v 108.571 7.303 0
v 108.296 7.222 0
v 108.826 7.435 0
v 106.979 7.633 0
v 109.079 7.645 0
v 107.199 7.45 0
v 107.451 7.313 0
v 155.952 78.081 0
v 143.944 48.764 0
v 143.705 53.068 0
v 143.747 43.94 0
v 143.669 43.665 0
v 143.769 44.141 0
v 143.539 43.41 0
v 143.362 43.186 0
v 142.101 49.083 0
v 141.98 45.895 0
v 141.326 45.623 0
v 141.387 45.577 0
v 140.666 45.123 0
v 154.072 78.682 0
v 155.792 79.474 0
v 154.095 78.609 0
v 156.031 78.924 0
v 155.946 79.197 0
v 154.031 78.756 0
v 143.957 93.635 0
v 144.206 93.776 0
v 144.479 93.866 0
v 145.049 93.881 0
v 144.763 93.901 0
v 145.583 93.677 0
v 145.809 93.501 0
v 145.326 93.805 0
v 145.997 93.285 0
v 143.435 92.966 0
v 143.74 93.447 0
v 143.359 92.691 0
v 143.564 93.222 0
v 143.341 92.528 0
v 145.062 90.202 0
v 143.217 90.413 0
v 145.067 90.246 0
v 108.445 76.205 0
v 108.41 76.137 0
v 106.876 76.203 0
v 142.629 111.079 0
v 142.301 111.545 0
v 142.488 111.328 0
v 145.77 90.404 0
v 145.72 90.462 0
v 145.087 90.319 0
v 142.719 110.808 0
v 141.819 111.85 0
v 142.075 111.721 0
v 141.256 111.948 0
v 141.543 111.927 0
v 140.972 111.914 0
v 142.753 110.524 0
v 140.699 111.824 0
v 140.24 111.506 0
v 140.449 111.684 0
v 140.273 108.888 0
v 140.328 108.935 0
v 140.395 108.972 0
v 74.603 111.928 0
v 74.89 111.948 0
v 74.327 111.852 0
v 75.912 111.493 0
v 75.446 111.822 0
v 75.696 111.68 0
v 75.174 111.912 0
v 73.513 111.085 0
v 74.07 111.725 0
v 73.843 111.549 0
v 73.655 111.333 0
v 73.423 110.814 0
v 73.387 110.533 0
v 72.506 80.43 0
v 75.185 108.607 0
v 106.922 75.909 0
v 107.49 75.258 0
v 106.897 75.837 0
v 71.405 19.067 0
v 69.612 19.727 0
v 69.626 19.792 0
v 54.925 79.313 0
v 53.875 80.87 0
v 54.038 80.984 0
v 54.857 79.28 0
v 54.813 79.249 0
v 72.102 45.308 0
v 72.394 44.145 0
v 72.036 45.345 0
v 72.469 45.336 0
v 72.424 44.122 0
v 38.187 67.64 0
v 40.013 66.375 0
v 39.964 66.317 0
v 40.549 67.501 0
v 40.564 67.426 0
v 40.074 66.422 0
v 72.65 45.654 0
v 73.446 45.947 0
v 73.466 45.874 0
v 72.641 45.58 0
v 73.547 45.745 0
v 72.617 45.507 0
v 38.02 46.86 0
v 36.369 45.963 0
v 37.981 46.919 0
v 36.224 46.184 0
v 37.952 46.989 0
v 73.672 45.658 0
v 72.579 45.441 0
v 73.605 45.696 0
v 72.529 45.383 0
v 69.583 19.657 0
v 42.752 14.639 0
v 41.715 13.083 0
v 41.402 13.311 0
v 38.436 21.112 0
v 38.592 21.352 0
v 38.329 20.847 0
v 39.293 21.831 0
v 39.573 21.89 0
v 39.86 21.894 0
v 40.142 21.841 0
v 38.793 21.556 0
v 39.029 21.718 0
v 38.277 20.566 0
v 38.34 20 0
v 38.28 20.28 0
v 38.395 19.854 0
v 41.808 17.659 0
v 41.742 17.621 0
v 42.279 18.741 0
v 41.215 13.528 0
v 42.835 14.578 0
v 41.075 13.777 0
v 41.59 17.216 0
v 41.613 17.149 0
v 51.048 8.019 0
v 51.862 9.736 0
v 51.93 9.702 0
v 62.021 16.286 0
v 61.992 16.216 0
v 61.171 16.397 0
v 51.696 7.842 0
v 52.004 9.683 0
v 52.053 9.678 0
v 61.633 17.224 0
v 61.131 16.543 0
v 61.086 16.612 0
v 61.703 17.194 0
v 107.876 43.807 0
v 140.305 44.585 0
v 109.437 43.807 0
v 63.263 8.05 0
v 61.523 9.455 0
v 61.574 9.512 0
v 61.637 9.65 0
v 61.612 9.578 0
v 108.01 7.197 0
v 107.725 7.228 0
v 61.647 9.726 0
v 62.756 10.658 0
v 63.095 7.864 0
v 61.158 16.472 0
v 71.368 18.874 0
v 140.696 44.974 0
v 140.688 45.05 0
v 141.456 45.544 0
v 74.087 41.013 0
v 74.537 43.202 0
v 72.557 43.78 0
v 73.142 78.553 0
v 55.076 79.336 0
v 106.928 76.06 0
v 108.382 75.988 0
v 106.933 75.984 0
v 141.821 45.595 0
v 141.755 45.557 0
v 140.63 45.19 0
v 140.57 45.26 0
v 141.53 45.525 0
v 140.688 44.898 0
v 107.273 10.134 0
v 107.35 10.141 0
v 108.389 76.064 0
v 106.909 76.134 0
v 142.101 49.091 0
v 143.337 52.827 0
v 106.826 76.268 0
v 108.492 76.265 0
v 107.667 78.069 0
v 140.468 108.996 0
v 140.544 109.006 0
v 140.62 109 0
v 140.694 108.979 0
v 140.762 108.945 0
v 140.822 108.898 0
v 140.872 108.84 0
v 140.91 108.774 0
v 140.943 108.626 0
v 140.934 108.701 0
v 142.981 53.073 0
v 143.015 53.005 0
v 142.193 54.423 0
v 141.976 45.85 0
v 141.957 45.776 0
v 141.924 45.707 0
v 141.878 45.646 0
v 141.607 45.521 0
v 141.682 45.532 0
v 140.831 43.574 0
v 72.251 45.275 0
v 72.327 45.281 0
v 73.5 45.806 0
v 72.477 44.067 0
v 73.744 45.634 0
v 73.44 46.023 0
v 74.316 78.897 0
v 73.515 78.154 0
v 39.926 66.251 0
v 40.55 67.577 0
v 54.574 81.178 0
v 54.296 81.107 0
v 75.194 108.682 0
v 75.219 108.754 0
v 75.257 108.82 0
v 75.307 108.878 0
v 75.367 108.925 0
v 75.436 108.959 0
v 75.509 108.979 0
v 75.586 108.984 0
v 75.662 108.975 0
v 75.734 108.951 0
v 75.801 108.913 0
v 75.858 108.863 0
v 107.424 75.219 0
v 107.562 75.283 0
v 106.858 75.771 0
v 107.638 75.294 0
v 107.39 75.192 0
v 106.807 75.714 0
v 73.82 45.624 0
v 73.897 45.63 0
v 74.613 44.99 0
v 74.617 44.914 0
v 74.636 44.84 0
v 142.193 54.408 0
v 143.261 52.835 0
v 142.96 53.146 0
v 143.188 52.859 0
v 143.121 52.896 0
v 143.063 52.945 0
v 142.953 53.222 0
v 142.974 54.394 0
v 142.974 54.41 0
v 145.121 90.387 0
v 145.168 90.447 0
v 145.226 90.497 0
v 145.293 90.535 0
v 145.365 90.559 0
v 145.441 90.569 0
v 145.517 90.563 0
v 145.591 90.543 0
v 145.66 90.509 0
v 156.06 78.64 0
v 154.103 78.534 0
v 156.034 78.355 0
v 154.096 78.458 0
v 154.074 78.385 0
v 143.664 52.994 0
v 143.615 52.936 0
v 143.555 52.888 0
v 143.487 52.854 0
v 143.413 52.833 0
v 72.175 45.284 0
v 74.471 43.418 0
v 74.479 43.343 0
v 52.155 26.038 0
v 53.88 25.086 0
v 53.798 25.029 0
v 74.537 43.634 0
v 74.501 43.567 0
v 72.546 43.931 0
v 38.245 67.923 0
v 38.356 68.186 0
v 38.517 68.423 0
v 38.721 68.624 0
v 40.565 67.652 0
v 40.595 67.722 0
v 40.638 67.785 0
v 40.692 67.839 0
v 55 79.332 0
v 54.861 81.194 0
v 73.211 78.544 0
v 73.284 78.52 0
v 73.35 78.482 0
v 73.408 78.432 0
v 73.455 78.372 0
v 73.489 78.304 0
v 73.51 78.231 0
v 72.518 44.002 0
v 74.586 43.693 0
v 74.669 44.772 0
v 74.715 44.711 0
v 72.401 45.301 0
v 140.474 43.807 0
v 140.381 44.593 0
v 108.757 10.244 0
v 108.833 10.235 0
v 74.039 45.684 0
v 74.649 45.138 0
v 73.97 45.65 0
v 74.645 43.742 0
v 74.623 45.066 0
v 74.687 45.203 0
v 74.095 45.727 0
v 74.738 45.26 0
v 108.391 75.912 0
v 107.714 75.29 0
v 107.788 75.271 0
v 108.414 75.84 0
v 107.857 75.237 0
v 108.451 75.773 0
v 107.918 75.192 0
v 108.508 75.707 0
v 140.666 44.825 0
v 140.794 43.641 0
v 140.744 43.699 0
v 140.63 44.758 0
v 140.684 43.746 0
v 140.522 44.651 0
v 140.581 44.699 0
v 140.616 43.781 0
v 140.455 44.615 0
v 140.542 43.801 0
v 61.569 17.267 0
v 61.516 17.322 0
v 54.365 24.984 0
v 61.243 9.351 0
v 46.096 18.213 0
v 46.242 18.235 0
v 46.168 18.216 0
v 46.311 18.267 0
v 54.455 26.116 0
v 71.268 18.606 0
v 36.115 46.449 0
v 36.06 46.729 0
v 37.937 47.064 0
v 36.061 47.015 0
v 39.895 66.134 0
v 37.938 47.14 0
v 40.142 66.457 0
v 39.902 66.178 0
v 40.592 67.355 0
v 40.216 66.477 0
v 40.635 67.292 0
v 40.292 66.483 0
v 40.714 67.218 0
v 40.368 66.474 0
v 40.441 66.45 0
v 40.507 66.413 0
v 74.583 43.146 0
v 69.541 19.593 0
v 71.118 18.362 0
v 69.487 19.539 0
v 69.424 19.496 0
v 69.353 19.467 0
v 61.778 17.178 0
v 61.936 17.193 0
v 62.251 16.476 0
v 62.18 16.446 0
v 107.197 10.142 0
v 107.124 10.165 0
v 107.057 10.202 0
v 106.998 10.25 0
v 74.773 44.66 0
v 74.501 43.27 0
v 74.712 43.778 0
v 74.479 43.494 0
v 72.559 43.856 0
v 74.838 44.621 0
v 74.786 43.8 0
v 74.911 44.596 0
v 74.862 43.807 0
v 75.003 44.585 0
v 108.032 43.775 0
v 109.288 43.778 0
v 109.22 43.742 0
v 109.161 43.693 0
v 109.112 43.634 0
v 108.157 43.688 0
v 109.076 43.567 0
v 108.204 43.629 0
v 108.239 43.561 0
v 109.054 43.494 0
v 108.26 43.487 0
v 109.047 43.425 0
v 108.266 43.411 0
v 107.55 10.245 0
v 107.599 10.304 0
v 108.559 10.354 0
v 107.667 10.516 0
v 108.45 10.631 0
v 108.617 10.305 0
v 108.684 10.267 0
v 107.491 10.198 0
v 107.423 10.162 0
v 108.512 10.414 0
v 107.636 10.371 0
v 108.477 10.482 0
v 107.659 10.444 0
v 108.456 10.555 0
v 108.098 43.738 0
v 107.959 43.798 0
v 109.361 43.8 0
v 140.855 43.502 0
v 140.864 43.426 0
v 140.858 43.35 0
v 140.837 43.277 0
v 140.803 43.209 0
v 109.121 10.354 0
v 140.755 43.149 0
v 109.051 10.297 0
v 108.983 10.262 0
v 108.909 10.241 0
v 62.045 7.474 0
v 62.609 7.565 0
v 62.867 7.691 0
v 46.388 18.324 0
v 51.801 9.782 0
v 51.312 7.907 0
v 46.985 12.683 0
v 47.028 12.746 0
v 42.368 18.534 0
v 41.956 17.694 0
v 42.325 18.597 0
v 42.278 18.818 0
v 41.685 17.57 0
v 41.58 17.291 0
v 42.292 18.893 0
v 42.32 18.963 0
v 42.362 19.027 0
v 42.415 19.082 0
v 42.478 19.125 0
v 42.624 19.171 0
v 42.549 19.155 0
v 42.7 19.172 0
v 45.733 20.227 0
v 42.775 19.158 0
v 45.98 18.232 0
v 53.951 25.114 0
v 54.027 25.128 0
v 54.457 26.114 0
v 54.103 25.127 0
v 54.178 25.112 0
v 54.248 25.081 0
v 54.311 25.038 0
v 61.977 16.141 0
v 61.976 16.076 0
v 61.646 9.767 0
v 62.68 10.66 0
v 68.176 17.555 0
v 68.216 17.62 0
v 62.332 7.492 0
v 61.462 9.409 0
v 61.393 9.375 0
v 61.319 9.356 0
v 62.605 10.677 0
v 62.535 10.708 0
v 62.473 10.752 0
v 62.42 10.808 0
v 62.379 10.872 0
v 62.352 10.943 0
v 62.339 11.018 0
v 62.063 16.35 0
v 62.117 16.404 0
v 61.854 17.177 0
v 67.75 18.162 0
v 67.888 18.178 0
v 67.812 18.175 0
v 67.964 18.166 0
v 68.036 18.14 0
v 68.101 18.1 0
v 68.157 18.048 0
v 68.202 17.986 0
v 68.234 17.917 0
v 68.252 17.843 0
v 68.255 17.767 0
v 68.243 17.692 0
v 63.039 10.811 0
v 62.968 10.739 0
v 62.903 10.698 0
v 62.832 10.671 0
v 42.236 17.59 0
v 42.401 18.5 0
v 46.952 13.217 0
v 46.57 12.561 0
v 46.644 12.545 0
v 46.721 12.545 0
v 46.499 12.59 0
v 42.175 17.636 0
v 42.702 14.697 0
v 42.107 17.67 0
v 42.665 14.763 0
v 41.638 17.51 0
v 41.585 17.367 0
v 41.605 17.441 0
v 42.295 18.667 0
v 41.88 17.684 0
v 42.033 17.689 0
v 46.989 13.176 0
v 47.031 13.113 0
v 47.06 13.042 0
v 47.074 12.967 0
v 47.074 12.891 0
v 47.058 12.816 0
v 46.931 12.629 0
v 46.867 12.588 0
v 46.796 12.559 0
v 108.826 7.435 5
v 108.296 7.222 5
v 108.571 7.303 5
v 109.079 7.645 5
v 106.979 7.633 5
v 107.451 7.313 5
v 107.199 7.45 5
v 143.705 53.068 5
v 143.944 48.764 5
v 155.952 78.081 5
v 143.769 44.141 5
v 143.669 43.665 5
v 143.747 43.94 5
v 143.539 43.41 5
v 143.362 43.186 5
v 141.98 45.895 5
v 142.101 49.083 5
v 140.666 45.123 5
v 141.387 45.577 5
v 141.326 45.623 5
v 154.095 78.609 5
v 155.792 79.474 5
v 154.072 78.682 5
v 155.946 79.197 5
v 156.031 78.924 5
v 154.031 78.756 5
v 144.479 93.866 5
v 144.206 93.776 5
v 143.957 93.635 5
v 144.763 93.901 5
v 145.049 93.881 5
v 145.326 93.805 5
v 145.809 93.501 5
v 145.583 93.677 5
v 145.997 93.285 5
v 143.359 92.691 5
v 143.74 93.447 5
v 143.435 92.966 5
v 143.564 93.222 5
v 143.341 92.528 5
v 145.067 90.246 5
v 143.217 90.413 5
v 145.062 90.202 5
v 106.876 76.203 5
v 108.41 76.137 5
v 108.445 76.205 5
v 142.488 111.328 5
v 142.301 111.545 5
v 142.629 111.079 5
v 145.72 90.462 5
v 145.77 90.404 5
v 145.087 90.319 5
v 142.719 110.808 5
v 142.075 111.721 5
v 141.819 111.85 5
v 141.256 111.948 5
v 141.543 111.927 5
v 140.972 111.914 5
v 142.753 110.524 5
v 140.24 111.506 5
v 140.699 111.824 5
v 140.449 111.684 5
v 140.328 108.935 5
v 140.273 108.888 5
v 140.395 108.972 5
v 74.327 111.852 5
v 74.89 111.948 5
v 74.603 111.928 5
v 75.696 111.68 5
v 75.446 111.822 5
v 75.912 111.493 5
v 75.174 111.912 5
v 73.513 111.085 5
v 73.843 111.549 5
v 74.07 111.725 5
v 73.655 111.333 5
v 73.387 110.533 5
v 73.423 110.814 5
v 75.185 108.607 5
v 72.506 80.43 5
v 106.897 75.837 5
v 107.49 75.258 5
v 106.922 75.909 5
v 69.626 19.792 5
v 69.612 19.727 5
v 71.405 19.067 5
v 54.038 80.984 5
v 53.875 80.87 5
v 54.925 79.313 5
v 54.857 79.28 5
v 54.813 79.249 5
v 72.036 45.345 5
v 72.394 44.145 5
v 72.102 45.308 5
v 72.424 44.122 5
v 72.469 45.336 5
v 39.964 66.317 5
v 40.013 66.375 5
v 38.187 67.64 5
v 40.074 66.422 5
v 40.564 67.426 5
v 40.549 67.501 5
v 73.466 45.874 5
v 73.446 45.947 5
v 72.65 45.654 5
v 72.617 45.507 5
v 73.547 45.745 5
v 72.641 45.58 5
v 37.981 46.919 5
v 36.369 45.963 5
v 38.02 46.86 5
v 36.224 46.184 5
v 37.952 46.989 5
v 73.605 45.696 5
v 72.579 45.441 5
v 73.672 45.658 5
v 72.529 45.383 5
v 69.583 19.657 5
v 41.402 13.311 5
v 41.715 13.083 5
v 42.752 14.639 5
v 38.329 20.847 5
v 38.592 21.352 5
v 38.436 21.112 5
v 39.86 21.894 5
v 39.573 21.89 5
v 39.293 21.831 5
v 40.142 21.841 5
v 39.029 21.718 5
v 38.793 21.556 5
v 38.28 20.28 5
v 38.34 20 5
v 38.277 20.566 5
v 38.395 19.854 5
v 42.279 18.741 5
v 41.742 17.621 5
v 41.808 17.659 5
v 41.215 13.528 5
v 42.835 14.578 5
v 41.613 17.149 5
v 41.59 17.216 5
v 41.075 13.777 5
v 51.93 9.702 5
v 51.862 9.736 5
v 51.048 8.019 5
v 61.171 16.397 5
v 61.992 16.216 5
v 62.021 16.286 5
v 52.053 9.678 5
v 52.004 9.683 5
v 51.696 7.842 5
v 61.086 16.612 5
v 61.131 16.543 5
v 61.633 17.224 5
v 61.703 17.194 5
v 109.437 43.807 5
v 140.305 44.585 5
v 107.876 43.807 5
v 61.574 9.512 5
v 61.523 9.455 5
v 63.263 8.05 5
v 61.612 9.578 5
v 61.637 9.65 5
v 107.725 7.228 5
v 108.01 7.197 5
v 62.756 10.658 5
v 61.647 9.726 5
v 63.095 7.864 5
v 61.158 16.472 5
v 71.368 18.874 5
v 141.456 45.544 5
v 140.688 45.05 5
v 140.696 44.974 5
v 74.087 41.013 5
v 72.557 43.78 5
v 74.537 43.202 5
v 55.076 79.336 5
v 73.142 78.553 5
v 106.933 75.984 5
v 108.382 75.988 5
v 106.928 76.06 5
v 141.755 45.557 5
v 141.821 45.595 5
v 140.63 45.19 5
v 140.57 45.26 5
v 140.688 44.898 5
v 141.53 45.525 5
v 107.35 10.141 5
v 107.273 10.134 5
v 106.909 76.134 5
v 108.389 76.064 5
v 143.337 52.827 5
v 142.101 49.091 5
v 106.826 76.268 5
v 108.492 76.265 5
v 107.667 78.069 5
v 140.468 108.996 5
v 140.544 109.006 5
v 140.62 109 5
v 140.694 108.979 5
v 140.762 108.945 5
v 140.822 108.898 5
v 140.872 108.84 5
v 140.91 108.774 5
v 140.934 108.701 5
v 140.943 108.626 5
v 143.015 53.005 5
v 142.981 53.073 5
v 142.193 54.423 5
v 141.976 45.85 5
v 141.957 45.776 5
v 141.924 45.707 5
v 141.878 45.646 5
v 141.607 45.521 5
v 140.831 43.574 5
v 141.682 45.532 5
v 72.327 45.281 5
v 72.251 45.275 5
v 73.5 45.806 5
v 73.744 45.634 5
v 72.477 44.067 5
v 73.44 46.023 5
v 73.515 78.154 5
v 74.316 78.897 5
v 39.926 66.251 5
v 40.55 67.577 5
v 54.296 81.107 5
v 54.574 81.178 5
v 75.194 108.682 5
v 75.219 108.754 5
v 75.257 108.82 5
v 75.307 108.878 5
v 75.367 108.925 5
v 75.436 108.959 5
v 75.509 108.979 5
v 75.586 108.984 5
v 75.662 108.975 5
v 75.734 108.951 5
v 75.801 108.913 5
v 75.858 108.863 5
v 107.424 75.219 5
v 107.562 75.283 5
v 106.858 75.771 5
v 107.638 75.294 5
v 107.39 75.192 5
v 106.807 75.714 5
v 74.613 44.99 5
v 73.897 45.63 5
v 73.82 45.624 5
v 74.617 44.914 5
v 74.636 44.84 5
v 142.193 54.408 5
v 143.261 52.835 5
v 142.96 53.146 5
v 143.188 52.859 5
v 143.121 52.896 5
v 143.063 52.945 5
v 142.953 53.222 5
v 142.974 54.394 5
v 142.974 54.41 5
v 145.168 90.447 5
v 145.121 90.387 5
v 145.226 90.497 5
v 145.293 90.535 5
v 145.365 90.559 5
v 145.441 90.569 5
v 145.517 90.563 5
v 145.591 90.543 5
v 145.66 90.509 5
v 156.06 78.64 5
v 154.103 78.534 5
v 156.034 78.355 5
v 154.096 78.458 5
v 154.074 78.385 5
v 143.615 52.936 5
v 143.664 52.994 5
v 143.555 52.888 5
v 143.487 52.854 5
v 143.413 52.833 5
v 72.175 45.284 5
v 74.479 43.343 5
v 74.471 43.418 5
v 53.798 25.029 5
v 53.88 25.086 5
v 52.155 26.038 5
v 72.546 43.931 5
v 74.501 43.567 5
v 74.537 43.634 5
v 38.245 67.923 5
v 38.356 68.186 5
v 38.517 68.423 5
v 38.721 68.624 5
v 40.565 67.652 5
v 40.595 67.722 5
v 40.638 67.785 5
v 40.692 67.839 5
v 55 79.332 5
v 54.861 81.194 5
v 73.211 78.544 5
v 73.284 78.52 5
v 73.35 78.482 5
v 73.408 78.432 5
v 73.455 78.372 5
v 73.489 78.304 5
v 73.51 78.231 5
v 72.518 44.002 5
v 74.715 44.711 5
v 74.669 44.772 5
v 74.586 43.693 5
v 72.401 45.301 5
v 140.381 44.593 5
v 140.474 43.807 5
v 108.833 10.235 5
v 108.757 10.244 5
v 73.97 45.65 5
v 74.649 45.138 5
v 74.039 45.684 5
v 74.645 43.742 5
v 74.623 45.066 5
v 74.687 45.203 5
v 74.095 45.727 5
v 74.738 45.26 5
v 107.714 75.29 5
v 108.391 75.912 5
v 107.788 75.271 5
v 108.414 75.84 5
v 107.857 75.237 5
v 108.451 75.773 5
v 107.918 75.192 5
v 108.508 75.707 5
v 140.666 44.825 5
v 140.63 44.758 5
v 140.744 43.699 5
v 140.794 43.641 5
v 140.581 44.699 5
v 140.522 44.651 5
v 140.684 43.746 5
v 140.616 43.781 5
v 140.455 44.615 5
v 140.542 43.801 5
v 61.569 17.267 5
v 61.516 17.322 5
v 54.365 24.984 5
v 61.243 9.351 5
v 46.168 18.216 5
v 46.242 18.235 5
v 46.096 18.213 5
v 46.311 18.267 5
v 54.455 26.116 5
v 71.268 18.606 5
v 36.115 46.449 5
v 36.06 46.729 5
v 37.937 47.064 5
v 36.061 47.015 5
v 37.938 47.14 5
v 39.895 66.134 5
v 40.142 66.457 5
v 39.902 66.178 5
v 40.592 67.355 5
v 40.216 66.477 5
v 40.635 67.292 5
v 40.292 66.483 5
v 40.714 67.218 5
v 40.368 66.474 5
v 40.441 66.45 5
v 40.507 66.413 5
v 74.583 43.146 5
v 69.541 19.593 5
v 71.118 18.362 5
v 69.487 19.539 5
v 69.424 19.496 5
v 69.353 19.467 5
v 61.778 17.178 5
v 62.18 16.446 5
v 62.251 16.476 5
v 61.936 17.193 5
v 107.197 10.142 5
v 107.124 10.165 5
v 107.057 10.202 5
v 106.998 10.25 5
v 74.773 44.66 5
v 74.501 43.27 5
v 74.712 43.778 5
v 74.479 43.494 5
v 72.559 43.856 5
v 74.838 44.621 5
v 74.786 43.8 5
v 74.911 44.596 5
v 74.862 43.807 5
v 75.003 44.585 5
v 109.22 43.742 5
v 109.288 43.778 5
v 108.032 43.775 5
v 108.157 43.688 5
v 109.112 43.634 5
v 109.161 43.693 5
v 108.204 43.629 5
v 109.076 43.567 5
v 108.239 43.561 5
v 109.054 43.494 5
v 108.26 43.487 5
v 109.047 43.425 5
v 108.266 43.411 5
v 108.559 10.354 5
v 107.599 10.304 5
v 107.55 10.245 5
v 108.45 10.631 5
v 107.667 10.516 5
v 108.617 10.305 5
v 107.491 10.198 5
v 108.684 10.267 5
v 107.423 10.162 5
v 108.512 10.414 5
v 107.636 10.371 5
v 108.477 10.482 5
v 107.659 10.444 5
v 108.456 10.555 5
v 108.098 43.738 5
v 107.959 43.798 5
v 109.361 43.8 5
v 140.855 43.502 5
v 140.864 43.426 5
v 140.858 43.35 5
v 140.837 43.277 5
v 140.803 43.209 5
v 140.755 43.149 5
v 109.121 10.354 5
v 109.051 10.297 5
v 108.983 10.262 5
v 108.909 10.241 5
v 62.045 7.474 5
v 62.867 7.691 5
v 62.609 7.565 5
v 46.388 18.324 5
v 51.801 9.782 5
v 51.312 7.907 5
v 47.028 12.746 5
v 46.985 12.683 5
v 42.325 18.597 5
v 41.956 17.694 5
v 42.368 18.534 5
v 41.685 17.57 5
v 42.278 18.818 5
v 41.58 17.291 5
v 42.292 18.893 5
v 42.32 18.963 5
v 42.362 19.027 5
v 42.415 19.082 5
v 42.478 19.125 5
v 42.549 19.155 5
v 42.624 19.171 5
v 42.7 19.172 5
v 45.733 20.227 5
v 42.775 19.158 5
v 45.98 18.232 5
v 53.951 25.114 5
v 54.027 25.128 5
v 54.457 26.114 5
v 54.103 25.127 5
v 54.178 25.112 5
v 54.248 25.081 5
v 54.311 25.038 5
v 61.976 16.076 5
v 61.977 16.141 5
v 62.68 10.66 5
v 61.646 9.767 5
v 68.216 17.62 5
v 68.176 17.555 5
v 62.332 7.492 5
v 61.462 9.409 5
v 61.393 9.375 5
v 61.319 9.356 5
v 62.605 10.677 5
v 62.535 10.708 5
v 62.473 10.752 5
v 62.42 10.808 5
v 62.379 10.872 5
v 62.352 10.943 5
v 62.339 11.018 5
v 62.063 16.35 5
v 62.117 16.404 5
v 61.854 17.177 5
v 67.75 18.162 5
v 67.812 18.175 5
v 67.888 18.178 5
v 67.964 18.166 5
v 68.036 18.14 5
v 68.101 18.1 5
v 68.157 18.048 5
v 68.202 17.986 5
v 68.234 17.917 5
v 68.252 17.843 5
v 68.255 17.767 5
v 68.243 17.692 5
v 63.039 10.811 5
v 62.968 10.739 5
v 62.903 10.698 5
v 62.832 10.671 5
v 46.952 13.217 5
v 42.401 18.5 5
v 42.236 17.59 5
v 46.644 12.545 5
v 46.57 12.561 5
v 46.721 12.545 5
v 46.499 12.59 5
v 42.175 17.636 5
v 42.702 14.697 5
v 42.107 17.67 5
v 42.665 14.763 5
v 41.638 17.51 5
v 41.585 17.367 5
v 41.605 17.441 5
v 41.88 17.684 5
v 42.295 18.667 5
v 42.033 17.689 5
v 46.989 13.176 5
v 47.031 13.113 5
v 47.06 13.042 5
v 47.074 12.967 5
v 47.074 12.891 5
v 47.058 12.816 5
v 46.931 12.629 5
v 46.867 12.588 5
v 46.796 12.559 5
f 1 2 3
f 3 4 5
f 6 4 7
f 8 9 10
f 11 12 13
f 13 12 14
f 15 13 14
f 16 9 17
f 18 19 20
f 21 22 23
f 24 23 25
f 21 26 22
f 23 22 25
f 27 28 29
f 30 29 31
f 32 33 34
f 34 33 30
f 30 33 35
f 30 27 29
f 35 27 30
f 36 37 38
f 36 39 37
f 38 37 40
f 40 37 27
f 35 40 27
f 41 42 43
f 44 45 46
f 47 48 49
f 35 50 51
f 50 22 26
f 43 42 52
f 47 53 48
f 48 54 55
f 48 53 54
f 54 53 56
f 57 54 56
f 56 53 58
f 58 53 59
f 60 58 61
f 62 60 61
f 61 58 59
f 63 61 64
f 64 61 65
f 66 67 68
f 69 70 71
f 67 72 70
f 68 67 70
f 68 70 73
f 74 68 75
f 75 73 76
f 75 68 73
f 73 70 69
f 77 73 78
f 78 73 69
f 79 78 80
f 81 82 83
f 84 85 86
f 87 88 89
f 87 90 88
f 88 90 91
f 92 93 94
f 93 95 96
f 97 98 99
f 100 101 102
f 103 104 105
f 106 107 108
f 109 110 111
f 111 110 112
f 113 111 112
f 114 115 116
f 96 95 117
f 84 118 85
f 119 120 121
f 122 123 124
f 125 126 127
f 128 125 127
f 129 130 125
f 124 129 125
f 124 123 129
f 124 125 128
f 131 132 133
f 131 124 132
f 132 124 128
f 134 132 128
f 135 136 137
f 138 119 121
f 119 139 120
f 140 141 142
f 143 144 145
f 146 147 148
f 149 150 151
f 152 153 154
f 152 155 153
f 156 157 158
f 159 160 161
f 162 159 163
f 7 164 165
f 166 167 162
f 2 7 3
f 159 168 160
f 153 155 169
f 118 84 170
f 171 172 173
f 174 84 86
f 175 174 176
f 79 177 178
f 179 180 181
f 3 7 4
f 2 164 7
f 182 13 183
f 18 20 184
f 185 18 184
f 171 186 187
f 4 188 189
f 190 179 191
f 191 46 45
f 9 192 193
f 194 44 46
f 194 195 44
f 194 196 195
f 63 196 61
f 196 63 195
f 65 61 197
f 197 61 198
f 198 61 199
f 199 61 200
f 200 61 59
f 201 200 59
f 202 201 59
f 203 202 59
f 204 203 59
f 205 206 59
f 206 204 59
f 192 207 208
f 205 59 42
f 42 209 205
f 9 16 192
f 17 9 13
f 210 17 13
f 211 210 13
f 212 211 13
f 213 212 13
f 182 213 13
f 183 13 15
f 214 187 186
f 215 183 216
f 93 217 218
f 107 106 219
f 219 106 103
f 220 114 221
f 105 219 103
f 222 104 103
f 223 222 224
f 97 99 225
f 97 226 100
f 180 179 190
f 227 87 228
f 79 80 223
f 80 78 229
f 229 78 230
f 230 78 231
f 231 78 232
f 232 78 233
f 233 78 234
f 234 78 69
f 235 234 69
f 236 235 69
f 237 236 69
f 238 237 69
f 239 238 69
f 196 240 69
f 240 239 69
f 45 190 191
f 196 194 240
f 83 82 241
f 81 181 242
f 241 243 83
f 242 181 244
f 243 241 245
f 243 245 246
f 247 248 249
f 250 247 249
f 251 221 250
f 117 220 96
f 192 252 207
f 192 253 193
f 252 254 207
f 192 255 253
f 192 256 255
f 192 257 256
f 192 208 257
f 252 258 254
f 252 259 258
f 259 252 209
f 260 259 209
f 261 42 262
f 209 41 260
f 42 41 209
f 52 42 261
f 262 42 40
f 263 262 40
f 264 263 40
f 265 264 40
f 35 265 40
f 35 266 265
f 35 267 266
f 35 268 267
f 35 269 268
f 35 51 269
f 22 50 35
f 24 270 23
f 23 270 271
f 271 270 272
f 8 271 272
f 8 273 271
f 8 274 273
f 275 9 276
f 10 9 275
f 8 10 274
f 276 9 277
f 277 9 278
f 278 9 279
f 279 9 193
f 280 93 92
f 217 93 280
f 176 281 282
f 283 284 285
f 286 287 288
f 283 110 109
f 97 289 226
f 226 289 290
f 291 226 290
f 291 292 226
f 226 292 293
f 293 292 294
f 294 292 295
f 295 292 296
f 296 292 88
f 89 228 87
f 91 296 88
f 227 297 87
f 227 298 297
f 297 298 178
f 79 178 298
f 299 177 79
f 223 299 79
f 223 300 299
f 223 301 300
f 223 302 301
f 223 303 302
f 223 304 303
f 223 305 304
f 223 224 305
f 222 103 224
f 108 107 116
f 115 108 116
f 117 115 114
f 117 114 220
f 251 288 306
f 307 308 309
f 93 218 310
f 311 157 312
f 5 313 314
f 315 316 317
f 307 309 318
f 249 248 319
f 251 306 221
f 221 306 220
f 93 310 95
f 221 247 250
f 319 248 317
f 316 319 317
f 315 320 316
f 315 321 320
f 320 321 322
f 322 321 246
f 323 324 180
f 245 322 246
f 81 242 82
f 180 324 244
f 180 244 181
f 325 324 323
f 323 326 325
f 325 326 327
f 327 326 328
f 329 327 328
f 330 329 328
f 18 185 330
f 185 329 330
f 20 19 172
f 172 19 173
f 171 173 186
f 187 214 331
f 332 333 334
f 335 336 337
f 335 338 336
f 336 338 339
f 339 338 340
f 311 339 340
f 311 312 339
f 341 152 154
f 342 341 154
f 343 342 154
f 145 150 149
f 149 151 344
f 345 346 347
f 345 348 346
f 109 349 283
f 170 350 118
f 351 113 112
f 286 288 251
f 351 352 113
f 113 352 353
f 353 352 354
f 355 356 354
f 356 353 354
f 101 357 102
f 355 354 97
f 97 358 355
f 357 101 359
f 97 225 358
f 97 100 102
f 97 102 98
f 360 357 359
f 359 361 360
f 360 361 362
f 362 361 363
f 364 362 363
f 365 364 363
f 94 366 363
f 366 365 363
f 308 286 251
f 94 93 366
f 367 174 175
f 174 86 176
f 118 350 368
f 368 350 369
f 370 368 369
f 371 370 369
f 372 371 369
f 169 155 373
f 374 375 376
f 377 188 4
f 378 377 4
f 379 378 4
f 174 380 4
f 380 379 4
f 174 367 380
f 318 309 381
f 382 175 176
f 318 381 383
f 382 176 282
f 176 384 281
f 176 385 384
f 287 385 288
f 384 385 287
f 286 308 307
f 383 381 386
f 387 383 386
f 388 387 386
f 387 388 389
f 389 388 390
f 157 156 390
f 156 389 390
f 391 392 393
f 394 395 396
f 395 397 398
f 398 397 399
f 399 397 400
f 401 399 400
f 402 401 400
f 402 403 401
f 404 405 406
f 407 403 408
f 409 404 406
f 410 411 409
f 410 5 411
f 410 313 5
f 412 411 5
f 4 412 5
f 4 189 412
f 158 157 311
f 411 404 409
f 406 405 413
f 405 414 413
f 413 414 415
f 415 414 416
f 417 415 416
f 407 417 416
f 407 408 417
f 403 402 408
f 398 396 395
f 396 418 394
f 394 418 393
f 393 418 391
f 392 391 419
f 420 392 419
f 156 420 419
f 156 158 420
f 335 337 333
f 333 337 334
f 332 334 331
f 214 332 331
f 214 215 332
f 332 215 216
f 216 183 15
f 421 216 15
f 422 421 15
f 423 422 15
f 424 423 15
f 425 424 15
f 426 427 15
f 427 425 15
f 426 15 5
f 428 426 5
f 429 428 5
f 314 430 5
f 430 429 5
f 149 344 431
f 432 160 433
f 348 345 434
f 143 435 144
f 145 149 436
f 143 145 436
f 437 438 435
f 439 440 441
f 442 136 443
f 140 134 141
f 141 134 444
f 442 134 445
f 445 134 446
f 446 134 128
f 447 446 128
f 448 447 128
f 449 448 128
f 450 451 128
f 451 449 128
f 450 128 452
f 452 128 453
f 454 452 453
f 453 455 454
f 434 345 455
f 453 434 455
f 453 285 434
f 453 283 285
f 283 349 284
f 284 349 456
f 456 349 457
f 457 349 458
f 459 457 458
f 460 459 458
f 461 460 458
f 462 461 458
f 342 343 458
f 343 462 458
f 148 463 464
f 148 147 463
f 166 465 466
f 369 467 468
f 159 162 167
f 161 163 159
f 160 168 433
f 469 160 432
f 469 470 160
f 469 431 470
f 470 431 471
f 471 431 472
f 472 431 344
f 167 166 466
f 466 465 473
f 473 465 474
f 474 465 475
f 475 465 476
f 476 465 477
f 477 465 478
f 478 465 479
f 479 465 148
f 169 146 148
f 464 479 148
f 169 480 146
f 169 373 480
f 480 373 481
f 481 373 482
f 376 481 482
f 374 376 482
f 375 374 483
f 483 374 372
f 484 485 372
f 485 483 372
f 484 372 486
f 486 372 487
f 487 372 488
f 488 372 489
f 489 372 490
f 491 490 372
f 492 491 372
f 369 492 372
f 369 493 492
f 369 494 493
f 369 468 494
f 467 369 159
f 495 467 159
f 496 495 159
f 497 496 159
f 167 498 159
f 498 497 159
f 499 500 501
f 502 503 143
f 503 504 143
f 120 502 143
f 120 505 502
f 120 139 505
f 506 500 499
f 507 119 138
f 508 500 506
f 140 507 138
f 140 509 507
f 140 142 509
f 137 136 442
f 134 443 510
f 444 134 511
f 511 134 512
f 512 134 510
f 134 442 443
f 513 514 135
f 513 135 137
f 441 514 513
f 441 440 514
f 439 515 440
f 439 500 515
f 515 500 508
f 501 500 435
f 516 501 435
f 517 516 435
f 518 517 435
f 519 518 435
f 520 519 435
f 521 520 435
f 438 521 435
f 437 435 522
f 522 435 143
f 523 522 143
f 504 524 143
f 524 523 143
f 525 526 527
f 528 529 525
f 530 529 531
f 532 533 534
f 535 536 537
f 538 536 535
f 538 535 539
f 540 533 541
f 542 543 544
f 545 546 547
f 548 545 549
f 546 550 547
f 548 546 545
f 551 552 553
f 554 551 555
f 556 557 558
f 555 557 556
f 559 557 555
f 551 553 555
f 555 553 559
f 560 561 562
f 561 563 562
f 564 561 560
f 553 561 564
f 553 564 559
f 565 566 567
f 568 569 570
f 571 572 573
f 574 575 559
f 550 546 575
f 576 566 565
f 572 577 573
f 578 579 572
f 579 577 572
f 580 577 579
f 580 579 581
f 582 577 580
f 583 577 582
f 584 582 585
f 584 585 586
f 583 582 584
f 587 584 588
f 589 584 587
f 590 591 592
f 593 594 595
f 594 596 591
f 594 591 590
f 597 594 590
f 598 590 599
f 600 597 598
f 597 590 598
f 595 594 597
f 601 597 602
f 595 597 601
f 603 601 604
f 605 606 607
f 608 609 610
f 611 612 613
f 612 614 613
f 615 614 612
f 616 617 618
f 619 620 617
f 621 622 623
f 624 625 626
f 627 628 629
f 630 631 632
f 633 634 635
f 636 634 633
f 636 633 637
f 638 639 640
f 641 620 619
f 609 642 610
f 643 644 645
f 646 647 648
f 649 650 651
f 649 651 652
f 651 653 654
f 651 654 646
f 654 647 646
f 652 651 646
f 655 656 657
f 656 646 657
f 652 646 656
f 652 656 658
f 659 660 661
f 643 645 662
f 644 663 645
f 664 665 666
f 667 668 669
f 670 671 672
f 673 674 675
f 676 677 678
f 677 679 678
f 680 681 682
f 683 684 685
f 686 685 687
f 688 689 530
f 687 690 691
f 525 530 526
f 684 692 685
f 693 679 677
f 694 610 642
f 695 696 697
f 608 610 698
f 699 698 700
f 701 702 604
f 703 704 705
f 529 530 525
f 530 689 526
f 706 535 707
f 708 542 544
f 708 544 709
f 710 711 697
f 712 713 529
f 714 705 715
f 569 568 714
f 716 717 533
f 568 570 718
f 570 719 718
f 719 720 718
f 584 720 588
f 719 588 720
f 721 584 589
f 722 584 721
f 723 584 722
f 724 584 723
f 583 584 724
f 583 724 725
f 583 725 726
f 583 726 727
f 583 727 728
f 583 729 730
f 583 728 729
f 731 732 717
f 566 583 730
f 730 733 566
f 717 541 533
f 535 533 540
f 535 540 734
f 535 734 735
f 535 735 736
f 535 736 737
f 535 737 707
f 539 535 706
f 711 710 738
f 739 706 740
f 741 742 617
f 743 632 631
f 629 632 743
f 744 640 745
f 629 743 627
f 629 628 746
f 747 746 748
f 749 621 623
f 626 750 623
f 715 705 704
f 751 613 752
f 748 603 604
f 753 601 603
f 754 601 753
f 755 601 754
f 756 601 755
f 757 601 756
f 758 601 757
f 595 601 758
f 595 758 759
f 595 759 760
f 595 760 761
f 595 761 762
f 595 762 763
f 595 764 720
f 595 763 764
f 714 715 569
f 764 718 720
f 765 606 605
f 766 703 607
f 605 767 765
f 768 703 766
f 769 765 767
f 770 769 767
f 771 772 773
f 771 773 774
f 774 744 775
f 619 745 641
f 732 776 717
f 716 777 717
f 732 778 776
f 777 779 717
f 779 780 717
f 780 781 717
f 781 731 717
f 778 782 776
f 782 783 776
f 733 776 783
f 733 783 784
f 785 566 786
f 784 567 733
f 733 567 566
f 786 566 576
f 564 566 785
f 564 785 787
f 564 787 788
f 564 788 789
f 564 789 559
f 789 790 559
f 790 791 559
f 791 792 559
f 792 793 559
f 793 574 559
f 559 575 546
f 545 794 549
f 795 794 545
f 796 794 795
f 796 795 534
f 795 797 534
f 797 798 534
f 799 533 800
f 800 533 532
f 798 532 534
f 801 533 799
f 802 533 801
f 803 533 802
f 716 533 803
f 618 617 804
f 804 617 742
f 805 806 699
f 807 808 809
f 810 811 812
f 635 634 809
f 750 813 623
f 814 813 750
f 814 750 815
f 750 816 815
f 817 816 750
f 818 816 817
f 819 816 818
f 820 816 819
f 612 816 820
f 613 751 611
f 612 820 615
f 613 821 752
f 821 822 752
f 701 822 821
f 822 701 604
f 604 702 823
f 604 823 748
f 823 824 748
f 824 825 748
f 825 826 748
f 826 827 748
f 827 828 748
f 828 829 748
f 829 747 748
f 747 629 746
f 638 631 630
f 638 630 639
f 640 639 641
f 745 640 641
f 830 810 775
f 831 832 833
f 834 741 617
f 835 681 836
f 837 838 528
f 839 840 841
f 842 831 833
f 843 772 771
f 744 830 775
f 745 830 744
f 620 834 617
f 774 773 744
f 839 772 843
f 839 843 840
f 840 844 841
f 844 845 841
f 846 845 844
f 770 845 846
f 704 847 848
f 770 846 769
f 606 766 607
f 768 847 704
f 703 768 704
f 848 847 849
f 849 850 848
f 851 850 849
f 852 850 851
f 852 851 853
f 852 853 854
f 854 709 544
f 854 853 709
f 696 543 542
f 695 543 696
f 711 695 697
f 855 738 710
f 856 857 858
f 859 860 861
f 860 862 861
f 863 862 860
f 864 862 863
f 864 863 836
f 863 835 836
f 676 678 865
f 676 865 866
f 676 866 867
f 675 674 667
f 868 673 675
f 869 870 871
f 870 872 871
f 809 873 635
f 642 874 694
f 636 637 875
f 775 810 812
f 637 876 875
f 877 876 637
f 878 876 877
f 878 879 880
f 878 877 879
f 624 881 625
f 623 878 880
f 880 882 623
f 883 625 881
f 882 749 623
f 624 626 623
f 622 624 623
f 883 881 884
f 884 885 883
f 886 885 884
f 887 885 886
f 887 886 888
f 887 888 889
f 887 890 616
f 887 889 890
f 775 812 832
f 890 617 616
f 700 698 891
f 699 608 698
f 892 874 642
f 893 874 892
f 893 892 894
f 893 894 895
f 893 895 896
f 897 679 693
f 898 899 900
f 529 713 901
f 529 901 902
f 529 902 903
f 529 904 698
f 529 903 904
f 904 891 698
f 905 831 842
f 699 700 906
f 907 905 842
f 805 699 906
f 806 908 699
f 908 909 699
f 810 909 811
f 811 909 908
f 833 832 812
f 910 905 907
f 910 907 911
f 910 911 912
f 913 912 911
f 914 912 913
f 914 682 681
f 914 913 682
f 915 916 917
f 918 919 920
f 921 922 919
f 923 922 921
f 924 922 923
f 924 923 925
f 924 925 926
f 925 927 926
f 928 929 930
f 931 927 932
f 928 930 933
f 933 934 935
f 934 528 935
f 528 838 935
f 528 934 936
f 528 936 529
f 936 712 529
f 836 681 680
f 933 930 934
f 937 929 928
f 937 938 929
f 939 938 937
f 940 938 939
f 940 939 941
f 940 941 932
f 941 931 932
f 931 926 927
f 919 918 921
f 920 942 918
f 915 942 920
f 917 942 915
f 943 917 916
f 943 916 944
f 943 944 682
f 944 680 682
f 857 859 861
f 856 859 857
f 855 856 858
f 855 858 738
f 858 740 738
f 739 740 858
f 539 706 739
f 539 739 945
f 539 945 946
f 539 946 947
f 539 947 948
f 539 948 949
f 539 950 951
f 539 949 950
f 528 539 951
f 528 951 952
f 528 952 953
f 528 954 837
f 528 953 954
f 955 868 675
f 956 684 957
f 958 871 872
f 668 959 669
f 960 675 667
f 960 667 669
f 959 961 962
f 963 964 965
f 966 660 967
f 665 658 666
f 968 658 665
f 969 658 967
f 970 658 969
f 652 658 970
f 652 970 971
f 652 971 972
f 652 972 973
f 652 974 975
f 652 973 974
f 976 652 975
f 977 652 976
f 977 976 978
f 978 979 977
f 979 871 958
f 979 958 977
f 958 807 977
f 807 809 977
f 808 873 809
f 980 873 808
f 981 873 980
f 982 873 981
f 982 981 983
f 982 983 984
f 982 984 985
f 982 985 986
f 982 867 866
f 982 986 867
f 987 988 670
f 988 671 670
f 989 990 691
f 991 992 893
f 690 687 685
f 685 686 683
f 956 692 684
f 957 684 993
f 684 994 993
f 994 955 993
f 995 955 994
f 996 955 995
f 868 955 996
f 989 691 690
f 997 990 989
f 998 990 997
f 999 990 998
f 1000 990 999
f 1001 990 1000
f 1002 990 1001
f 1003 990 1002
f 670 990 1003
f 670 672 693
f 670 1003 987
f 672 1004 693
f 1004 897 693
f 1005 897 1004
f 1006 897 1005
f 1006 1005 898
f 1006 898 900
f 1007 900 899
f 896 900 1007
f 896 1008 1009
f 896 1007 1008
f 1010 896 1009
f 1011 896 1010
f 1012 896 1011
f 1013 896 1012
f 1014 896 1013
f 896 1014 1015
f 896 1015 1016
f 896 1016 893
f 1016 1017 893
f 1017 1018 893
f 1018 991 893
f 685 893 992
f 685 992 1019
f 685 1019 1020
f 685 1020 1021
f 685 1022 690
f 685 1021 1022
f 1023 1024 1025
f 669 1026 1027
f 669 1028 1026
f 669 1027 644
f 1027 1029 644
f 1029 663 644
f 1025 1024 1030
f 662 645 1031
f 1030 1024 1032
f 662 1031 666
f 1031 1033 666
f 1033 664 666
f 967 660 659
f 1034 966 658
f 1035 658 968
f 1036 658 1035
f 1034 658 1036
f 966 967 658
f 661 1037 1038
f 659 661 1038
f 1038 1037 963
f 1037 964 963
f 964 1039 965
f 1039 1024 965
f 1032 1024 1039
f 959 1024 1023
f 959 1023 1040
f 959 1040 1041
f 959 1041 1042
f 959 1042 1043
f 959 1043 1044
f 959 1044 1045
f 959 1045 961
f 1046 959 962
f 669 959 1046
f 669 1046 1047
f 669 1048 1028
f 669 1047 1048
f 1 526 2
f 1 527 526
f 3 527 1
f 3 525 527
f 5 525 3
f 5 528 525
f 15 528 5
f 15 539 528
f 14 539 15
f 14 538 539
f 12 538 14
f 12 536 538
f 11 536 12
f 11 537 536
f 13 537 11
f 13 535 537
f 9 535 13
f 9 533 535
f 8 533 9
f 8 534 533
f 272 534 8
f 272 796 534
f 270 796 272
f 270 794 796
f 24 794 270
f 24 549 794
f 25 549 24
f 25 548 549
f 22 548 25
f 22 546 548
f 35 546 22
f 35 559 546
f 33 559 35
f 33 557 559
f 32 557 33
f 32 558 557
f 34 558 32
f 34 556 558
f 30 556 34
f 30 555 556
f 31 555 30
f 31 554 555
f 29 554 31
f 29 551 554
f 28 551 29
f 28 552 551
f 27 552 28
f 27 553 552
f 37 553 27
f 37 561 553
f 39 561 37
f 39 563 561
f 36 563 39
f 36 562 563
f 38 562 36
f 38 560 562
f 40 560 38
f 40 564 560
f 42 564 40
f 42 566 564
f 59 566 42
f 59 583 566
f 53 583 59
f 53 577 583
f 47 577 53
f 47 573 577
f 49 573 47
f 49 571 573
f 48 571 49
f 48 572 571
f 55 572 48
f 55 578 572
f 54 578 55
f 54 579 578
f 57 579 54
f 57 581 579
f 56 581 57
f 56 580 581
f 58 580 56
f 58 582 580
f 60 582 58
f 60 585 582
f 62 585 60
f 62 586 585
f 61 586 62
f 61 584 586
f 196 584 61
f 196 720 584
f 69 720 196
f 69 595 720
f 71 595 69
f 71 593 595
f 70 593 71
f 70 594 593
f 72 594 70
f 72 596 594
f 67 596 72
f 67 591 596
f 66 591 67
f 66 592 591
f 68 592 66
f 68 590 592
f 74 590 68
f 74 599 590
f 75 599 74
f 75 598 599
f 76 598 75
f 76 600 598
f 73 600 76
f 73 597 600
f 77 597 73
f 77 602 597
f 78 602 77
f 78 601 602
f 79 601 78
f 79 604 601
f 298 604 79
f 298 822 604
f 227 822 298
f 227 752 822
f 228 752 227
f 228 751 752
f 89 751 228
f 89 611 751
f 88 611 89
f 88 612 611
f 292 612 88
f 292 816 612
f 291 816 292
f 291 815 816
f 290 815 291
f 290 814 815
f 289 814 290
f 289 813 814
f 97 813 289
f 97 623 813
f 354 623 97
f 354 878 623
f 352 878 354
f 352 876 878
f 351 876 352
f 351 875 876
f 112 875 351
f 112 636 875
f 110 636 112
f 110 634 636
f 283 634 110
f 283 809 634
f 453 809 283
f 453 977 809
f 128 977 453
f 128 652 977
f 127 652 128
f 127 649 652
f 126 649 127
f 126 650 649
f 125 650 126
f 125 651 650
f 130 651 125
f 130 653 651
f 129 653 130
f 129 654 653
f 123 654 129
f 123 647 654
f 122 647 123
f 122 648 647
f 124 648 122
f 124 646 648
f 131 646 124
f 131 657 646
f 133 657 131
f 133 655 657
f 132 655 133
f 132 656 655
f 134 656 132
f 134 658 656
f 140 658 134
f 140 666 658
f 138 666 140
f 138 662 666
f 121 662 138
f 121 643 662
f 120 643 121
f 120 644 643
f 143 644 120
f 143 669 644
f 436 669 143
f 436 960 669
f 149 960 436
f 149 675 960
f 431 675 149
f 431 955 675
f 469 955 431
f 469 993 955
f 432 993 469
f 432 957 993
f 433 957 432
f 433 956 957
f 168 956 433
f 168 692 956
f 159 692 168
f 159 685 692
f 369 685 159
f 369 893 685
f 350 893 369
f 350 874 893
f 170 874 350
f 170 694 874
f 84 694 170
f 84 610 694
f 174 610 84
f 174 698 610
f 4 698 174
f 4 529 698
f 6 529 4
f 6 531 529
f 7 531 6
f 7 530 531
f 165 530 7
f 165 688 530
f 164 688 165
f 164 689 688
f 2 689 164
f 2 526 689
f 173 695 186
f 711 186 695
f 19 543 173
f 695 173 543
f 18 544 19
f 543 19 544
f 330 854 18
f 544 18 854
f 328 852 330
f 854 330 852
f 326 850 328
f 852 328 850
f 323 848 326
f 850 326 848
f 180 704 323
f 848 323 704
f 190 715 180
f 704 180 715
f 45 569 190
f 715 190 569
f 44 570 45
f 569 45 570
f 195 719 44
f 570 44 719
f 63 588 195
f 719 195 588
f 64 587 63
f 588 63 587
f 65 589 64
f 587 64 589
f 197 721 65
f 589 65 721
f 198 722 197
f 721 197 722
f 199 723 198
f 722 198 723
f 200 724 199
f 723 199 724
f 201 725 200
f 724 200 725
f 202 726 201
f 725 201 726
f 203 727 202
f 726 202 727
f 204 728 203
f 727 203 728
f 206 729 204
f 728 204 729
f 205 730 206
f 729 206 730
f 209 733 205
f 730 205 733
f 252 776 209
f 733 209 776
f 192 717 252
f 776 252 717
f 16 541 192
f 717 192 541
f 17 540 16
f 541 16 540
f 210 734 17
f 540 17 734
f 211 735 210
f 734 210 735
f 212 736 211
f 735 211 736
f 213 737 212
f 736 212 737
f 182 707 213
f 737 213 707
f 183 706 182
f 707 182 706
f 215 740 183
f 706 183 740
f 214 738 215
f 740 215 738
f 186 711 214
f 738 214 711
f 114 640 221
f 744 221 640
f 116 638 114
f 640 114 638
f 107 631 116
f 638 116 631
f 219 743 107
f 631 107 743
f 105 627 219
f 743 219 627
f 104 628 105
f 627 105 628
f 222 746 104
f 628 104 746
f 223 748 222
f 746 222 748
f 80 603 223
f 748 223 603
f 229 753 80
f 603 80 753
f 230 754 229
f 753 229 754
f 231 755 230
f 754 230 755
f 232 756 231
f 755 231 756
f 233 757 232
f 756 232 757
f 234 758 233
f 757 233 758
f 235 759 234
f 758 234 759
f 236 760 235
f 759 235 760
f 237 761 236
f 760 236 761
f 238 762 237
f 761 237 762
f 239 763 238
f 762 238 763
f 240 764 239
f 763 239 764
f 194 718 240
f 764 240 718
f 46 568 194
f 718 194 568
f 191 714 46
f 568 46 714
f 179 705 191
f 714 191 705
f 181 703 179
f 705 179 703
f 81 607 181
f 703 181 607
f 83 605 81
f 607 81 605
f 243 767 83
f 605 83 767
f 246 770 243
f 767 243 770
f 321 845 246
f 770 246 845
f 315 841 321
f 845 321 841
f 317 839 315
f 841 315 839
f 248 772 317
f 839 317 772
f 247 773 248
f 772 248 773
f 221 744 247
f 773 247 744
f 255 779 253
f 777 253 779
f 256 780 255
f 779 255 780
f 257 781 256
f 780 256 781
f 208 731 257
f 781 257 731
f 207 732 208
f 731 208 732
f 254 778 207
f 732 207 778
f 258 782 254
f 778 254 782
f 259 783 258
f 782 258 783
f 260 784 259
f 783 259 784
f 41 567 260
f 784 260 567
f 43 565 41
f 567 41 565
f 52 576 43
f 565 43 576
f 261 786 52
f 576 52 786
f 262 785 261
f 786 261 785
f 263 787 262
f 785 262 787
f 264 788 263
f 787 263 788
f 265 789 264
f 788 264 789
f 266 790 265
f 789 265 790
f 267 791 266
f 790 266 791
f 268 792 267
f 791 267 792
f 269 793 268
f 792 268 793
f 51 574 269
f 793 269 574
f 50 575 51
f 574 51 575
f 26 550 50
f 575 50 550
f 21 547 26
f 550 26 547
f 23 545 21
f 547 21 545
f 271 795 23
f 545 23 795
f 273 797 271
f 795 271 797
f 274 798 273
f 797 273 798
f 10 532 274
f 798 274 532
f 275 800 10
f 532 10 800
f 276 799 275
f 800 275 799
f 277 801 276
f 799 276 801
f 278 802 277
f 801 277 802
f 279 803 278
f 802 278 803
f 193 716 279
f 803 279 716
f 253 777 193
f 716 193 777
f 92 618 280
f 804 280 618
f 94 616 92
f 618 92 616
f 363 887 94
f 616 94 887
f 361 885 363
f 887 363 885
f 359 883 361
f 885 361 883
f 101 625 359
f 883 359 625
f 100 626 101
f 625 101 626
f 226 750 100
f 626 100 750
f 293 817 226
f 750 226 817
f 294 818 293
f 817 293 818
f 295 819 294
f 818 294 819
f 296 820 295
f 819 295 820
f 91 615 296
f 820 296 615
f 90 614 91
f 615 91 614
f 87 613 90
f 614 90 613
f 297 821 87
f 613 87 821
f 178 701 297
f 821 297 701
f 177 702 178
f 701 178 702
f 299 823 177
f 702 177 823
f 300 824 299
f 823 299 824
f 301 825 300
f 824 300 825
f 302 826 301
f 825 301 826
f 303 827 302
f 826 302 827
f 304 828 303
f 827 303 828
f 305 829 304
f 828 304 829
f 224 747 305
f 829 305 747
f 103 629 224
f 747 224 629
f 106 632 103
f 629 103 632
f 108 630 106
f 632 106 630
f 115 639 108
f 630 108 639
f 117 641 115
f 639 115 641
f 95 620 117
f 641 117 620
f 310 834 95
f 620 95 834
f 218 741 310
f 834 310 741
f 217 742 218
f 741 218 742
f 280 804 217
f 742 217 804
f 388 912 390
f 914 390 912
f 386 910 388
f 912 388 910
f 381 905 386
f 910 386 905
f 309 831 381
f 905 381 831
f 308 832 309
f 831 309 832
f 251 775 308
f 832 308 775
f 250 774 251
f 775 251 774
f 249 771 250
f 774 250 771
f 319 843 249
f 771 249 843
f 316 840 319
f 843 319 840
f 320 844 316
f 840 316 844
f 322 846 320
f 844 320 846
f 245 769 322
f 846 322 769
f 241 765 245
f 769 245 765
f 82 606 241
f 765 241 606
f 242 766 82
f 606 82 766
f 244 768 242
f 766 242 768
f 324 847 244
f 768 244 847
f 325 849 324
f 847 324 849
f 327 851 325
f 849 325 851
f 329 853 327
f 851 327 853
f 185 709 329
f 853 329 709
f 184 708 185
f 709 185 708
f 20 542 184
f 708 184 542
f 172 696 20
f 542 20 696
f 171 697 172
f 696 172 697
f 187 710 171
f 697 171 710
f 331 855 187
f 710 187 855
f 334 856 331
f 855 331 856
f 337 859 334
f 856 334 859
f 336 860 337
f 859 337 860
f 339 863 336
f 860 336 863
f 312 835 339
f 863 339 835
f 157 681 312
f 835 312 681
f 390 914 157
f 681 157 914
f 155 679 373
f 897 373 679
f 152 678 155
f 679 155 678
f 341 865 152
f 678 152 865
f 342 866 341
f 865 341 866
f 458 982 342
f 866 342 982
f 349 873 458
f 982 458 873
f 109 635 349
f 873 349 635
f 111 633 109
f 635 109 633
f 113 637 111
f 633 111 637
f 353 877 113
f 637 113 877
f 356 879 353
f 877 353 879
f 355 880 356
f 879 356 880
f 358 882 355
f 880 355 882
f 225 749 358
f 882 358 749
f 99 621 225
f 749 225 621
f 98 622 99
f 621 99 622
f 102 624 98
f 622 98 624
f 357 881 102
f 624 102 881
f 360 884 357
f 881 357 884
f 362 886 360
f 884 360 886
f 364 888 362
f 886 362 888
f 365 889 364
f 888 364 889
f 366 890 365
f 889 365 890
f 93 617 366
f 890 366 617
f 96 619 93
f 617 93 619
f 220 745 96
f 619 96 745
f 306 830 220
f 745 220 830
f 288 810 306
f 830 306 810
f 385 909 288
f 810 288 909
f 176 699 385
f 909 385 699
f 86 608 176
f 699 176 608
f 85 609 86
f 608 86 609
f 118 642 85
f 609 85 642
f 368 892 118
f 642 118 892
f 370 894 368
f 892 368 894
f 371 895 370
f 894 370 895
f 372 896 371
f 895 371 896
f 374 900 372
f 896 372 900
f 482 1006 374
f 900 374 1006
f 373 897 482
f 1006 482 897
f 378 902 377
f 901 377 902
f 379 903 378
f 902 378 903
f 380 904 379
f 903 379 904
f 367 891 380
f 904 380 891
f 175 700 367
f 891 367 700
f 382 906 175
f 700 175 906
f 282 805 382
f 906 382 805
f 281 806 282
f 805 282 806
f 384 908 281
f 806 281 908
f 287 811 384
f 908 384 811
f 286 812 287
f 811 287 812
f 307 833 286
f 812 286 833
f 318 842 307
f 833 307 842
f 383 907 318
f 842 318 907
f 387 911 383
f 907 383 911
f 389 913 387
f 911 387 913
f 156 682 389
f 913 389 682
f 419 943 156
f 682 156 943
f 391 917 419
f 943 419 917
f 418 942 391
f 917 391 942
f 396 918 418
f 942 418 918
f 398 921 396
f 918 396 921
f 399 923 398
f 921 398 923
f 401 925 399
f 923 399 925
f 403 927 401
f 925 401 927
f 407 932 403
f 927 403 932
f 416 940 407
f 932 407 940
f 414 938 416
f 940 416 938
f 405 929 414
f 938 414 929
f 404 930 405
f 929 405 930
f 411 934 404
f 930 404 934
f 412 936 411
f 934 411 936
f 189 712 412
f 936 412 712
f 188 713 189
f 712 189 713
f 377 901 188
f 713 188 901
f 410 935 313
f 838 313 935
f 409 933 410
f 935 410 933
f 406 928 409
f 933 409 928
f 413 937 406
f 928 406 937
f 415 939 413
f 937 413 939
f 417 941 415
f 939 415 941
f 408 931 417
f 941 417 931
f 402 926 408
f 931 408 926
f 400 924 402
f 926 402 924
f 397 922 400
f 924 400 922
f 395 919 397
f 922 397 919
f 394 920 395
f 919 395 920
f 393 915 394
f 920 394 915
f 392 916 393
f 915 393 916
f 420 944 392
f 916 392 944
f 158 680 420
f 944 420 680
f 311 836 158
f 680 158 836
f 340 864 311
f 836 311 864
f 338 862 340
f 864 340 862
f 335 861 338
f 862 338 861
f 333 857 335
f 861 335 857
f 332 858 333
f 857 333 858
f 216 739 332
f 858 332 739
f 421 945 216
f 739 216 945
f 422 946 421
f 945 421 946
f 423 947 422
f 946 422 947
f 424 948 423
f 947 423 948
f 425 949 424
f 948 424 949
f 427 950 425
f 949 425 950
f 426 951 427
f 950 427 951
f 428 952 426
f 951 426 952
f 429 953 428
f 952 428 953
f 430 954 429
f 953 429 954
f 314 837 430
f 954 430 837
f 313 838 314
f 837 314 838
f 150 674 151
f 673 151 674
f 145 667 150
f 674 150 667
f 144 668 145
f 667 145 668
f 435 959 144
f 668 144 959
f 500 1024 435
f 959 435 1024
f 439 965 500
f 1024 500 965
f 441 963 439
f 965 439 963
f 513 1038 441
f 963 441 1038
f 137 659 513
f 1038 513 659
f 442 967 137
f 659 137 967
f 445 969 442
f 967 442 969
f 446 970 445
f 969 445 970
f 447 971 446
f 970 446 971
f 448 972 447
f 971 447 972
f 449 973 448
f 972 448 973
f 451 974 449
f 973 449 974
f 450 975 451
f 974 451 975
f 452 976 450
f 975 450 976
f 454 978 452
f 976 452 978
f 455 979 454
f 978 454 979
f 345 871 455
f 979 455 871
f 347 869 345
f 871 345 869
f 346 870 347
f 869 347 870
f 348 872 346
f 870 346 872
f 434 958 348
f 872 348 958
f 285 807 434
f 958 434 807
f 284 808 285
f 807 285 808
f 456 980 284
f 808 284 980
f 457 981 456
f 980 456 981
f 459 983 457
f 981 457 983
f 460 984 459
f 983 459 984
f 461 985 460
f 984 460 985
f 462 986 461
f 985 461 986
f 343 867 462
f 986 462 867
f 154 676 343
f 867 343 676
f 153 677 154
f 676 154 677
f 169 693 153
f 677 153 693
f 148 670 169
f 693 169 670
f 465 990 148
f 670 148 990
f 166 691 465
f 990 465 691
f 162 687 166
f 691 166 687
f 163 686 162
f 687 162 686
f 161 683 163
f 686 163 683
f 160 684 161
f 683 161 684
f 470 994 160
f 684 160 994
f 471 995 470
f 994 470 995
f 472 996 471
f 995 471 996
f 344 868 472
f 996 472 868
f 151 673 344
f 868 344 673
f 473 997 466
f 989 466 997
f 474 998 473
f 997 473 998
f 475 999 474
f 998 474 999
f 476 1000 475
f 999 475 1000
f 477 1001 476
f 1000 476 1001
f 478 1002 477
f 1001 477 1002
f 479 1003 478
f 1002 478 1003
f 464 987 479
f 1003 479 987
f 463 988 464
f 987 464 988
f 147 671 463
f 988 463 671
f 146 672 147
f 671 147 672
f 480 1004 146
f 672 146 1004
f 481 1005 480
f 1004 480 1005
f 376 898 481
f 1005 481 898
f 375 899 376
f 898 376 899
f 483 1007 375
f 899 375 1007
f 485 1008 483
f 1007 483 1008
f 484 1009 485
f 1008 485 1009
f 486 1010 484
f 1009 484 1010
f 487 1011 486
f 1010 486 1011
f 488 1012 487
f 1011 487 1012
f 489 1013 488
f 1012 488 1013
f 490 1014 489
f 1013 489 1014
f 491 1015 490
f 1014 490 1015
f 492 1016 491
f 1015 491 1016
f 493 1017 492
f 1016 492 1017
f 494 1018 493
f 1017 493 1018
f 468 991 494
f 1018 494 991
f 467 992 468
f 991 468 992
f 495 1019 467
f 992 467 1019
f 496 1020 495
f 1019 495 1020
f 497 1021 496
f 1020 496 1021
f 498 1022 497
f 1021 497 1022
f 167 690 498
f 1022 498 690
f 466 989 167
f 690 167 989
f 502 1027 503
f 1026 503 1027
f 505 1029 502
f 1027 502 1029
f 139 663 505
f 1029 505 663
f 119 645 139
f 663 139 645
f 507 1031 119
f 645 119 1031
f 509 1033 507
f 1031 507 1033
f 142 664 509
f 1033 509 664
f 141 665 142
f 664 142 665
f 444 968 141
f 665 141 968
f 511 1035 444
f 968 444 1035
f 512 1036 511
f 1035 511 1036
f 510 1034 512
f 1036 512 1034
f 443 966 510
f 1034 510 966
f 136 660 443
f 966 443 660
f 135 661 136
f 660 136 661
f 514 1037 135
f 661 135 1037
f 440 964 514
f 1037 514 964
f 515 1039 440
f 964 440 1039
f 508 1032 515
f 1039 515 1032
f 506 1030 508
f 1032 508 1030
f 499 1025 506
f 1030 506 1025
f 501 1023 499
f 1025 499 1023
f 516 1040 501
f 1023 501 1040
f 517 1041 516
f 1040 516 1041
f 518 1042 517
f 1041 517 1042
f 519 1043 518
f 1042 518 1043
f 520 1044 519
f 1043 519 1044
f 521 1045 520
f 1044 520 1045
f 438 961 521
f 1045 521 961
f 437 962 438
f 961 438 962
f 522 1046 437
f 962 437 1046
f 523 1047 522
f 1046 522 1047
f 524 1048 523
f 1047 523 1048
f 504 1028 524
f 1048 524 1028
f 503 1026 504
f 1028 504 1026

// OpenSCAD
/*
 * Customizable Origami - Camel - https://www.thingiverse.com/thing:2734204
 * by Dennis Hofmann - https://www.thingiverse.com/mightynozzle/about
 * created 2017-12-27
 * version v1.0
 *
 * Changelog
 * --------------
 * v1.0:
 *      - final design
 * --------------
 * 
 * This work is licensed under the Creative Commons - Attribution - NonCommercial - ShareAlike license.
 * https://creativecommons.org/licenses/by-nc-sa/3.0/
 */


 // Parameter Section //
//-------------------//

// preview[view:north, tilt:top]

// The maximum size of the longest side. The shorter side will be automatically resized in same ratio.
max_size_in_millimeter = 120; //[20:300]

// The height of the model.
model_height_in_millimeter = 5; //[0.2:0.2:100]

// Thickness of the outer outline.
outline_size_in_millimeter = 1.9; //[0.5:0.1:20]

// Thickness of the inner outline.
inline_size_in_millimeter = 0.8; //[0.5:0.1:20]

// Roundiness of the ends of the inner outlines.
inline_edge_radius_in_millimeter = 0.4; //[0.0:0.1:5]

// Flip model
flip_model = "no"; //[yes,no]

/*[hidden]*/
max_size = max_size_in_millimeter;
model_height = model_height_in_millimeter;
$fn=32;

// Outer Points
A1 = [430, 222];
A2 = [459, 156];
A3 = [560, 101];
A4 = [672, 97];
A5 = [757, 209];
A6 = [790, 480];
A7 = [1169, 94];
A8 = [1540, 480];
A9 = [1542, 533];
A10 = [1673, 854];
A11 = [1567, 1004];
A12 = [1543, 591];
A13 = [1529, 1200];
A14 = [1165, 825];
A15 = [810, 1200];
A16 = [800, 857];
A17 = [593, 866];
A18 = [429, 733];
A19 = [406, 509];
A20 = [586, 281];
A21 = [499, 202];

outline = [A1, A2, A3, A4, A5, A6, A7, A8, A9, A10, A11, A12, A13, A14, A15, A16, A17, A18, A19, A20, A21];

// Inner Points
B1 = [666, 181];
B2 = [1176, 480];

// Polygons
C1 = [A1, A2, A3];
C2 = [A1, A3, A4, B1, A20, A21];
C3 = [A4, A5, B1];
C4 = [B1, A5, A6, A18, A19, A20];
C5 = [A18, A6, A16, A17];
C6 = [A6, B2, A7];
C7 = [A7, A8, B2];
C8 = [A6, A14, A15, A16];
C9 = [A6, B2, A8, A14];
C10 = [A14, A8, A9, A12, A13];
C11 = [A9, A10, A11, A12];

cut_polygons = [C1, C2, C3, C4, C5, C6, C7, C8, C9, C10, C11];

min_x = A19[0];
min_y = A7[1];
max_x = A10[0];
max_y = A15[1];

x_size = max_x - min_x;
y_size = max_y - min_y;

x_factor = max_size / x_size;
y_factor = max_size / y_size;

inline_size = x_size > y_size ? inline_size_in_millimeter / x_factor / 2: inline_size_in_millimeter / y_factor / 2;
inline_edge_radius = x_size > y_size ? inline_edge_radius_in_millimeter / x_factor: inline_edge_radius_in_millimeter / y_factor;
outline_size = x_size > y_size ? outline_size_in_millimeter / x_factor - inline_size: outline_size_in_millimeter / y_factor - inline_size;


 // Program Section //
//-----------------//

if(x_size > y_size) {
    resize(newsize=[max_size, x_factor * y_size, model_height]){
        if(flip_model == "yes") {
            mirror([0,1,0]) {
                rotate([180,180,0]) {    
                    create(outline, cut_polygons);
                }
            }
        } else {
            create(outline, cut_polygons);
        }
    }
} else {
    resize(newsize=[y_factor * x_size, max_size, model_height]){
        if(flip_model == "yes") {
            mirror([0,1,0]) {
                rotate([180,180,0]) {    
                    create(outline, cut_polygons);
                }
            }
        } else {
            create(outline, cut_polygons);
        }
    }
}


 // Module Section //
//----------------//

module create() {
    linear_extrude(height=1) {
        difference() {
            offset(r = -0) {
                offset(r = +outline_size) {
                    polygon(points = outline, convexity = 10);
                }
            }
            
            for(cut_polygon = [0:len(cut_polygons)]) {
                offset(r = +inline_edge_radius) {
                    offset(r = -inline_size - inline_edge_radius) {
                        polygon(points = cut_polygons[cut_polygon], convexity = 10);
                    }
                }
            }
        }
    }
}
